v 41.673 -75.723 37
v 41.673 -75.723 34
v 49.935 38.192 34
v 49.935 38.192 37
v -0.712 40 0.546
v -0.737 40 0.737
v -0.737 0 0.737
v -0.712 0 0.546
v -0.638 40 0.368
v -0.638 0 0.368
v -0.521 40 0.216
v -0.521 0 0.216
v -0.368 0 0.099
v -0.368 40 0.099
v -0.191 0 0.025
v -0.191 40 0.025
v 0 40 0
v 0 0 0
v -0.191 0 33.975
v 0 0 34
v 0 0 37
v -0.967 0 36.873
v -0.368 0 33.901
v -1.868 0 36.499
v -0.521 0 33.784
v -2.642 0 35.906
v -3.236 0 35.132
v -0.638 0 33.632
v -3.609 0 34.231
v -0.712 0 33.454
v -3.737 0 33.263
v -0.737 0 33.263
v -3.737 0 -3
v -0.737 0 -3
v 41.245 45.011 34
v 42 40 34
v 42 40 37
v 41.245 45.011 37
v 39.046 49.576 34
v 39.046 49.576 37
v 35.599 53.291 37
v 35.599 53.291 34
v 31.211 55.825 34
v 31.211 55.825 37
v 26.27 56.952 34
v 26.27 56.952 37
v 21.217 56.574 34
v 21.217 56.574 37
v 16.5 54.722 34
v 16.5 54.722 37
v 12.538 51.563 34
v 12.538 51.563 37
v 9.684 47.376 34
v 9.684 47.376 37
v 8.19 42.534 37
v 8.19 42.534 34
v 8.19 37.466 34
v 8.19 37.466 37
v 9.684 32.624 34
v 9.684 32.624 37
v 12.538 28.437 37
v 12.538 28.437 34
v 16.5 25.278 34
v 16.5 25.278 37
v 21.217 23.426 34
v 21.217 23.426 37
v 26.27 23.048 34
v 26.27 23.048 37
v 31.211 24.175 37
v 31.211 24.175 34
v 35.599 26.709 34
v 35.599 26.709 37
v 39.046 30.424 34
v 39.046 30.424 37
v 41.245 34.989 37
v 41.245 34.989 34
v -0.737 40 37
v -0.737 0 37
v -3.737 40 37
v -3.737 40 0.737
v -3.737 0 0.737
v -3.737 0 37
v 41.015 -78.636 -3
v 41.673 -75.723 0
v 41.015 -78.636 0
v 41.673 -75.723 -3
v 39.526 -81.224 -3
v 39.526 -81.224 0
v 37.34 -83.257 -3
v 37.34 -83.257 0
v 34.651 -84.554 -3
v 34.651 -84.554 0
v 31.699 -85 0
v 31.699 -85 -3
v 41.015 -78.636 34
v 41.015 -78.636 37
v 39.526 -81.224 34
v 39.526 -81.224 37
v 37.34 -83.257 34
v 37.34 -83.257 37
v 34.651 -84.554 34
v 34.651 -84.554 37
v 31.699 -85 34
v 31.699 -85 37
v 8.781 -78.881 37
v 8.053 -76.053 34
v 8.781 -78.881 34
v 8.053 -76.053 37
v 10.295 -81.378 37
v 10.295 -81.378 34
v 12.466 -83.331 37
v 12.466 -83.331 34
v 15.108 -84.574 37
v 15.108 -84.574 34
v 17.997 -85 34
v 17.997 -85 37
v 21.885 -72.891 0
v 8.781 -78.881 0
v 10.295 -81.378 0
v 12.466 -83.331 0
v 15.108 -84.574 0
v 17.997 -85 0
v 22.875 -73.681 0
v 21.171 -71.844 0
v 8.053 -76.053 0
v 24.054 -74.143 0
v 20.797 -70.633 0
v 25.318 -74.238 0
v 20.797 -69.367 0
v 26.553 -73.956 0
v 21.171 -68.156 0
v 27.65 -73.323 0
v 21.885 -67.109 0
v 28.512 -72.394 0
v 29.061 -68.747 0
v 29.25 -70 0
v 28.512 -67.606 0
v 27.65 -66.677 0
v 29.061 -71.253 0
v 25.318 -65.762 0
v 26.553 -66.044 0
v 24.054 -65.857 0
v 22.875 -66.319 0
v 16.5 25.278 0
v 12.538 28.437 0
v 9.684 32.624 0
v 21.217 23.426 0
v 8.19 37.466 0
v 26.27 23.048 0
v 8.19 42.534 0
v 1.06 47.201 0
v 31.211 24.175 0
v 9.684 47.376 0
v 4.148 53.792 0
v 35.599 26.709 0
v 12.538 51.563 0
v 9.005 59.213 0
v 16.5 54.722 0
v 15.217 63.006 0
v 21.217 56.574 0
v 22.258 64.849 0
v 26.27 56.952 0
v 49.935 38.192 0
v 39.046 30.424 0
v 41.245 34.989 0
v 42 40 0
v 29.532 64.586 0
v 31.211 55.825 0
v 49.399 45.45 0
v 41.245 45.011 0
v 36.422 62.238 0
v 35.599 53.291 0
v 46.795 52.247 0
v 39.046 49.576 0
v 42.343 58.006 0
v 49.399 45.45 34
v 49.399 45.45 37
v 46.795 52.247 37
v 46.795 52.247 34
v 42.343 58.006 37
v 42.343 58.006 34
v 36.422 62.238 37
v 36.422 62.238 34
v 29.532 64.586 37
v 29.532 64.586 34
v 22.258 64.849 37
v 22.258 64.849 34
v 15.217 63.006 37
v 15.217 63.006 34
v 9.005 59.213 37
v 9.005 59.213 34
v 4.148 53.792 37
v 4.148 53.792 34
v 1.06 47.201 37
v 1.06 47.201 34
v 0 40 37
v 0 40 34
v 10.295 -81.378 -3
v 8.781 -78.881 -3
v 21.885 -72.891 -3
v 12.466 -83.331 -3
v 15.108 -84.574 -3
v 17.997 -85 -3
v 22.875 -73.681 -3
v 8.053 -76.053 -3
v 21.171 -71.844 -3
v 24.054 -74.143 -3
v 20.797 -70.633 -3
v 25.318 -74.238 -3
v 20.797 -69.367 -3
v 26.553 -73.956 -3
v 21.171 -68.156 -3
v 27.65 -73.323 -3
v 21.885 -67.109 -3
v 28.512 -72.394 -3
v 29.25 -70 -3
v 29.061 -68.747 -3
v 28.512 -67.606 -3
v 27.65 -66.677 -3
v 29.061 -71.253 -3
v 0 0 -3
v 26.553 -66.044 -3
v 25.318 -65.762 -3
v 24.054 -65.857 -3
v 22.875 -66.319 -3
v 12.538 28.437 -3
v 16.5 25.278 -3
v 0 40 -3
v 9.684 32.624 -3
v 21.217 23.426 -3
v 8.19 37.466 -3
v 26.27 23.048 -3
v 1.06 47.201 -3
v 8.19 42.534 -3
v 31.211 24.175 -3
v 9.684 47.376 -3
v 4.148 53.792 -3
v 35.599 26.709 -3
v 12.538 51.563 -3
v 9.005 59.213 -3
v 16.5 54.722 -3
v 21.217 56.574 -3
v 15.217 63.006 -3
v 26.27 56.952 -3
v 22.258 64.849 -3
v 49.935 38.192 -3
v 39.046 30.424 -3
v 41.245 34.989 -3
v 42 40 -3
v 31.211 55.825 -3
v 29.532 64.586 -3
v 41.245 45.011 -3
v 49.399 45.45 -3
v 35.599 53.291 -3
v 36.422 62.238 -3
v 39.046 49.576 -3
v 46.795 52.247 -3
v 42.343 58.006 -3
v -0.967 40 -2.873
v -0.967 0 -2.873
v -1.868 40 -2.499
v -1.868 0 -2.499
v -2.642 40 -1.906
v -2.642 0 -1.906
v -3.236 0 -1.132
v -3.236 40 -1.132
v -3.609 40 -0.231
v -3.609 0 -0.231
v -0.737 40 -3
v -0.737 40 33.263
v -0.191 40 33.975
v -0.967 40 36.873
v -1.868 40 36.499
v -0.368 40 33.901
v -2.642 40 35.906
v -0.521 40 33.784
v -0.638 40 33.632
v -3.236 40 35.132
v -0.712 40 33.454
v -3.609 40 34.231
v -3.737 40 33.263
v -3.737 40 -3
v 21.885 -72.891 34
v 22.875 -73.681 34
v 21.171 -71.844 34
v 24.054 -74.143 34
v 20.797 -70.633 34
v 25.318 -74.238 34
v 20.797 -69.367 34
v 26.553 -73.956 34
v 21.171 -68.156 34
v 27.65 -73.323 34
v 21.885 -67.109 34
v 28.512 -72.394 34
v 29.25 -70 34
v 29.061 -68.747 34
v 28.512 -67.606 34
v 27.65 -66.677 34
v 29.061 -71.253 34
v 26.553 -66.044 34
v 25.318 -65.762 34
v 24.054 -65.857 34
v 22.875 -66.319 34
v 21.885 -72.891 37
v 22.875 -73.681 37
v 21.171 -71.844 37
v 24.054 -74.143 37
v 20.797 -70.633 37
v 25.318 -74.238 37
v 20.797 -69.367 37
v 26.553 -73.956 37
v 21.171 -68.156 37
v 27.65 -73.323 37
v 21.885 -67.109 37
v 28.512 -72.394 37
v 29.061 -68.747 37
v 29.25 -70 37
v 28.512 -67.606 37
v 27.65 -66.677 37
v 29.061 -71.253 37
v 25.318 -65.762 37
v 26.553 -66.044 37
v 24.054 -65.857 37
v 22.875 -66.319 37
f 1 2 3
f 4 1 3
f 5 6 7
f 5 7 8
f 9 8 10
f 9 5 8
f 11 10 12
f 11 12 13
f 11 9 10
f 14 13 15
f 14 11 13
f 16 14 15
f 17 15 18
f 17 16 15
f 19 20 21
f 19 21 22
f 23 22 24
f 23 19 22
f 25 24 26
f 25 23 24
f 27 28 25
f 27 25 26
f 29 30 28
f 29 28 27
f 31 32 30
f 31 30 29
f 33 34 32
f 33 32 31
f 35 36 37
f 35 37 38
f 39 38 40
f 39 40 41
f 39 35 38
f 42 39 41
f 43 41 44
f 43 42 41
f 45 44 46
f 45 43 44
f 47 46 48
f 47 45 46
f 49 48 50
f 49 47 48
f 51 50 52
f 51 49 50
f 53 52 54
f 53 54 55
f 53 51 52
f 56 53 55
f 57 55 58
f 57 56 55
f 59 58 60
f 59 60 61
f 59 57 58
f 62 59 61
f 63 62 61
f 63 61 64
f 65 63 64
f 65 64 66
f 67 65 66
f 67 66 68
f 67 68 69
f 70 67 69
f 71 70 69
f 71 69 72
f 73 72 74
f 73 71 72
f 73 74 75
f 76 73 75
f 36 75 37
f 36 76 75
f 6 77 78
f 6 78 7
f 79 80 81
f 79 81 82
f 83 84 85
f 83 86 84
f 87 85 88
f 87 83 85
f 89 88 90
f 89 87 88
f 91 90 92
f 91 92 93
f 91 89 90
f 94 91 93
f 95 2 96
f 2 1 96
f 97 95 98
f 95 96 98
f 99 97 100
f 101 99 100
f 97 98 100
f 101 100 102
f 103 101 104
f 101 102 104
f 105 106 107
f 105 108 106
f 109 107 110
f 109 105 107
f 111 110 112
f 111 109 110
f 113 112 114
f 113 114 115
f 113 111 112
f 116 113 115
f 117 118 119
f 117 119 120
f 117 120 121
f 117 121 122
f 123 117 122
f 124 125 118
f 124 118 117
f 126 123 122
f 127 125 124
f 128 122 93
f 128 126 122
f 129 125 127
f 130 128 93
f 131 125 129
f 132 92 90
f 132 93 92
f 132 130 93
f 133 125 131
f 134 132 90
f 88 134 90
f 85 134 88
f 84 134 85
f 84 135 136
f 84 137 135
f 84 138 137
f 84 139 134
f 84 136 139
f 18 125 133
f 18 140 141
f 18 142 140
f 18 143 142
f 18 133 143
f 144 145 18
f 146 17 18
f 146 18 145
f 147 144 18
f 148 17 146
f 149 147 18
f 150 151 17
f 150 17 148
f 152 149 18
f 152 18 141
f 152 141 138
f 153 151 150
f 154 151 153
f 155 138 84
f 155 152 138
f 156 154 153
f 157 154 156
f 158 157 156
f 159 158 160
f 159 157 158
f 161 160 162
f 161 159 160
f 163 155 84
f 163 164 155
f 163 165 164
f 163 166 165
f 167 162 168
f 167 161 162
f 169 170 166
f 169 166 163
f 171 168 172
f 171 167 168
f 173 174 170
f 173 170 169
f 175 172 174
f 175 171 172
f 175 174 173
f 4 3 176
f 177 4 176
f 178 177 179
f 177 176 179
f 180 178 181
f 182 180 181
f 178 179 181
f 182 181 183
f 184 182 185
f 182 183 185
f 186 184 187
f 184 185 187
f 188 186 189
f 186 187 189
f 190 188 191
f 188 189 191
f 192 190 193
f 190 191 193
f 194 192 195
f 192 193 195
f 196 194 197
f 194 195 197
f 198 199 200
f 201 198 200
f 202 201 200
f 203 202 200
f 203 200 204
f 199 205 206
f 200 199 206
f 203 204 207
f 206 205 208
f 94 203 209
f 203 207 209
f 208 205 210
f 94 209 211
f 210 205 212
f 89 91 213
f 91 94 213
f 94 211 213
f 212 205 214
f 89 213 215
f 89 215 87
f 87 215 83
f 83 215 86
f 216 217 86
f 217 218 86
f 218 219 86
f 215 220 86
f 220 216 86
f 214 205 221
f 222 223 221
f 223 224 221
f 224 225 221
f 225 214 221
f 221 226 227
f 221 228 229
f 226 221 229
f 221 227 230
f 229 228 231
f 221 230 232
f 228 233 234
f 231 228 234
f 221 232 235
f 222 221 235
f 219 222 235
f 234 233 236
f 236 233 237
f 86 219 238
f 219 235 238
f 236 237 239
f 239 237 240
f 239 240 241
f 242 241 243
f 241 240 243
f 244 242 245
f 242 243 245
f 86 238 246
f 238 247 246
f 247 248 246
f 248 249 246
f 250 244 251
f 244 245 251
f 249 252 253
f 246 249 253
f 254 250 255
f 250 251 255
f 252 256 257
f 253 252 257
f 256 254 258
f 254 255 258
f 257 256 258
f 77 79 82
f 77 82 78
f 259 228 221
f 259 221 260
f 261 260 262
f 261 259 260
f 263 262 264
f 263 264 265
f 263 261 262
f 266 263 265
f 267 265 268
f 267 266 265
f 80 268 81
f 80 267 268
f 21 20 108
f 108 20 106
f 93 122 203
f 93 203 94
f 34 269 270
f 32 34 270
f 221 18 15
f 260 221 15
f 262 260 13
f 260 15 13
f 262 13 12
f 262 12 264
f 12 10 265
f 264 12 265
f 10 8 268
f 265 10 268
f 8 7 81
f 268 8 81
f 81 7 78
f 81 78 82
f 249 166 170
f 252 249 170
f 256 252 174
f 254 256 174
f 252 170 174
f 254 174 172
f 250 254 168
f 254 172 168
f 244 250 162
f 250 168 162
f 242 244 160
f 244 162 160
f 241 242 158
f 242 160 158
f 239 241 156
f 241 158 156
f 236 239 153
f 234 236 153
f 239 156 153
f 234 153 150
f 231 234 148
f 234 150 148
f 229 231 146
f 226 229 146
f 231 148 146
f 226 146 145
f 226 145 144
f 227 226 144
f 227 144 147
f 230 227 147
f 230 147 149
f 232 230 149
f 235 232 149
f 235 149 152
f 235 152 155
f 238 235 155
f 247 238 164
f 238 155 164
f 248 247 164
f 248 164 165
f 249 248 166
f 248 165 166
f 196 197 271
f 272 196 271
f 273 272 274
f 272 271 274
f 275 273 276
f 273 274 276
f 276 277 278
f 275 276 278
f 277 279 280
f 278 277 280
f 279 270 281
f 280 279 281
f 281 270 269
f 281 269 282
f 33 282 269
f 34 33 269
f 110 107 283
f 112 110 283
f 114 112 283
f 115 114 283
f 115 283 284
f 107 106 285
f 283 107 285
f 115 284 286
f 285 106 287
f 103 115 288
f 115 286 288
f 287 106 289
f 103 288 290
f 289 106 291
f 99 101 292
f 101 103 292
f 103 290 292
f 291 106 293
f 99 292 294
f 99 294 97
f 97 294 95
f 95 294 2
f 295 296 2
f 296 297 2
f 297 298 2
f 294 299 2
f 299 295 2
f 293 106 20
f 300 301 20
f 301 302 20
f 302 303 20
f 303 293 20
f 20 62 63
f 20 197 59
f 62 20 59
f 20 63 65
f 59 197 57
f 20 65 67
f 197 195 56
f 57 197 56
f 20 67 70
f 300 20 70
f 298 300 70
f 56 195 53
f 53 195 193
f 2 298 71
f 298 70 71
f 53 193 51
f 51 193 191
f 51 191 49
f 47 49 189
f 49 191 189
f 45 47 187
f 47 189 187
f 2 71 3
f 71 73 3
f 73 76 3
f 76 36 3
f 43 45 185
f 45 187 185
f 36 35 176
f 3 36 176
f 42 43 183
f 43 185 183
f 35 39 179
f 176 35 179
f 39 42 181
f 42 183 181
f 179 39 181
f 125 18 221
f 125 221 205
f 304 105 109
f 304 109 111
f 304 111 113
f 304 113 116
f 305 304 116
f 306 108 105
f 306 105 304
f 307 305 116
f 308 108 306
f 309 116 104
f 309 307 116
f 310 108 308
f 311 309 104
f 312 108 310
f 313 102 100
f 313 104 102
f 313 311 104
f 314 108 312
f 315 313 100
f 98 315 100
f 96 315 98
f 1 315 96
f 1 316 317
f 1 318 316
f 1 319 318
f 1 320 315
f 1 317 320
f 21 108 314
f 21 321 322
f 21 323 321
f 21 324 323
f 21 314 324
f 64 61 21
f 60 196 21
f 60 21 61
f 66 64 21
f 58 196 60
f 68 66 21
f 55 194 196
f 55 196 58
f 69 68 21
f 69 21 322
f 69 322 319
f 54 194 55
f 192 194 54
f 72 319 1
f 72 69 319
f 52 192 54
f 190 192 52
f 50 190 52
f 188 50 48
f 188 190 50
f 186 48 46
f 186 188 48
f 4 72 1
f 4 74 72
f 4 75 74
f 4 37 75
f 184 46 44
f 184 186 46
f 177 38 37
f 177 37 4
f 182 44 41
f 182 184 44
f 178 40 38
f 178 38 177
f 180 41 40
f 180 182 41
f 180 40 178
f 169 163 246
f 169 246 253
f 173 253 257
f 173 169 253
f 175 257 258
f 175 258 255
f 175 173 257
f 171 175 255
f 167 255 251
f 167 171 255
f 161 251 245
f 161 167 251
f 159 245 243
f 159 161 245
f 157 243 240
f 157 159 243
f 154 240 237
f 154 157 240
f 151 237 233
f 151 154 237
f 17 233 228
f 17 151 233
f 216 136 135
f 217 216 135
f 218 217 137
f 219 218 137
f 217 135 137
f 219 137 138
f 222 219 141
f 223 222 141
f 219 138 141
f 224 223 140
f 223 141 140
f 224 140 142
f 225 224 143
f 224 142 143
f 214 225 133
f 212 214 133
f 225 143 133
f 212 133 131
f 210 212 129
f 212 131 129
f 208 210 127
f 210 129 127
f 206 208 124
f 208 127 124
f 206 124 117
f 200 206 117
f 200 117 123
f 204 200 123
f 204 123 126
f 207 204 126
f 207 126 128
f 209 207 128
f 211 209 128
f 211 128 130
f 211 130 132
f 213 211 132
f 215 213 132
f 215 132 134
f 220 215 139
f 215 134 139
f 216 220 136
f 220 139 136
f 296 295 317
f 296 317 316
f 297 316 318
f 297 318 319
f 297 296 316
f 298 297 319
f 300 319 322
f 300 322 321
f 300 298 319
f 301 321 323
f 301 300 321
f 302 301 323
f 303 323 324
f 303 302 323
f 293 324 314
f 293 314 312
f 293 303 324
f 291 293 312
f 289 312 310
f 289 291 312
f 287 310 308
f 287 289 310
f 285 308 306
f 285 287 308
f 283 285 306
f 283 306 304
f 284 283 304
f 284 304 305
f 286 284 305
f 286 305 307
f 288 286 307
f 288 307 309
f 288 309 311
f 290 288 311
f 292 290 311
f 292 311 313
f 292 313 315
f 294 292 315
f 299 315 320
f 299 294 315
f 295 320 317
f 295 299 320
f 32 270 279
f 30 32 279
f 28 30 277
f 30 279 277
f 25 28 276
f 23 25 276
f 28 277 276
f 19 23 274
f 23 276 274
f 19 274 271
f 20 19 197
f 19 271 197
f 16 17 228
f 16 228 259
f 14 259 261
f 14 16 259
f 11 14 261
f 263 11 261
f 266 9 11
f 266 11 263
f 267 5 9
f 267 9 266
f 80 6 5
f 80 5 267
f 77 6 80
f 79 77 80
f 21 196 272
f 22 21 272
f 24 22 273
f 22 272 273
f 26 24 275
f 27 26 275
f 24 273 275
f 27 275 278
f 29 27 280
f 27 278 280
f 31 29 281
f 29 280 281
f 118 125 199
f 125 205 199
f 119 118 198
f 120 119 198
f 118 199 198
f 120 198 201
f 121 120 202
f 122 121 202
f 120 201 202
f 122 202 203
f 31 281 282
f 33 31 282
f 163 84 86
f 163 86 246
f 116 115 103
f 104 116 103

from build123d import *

# Parameters (mm, degrees)
SKETCH1_R          = 17
SKETCH1_R_2        = 4.25
BASE_FLANGE1_DEPTH = 3
EDGE_FLANGE1_DEPTH = 40
FILLET1_R          = 10
FILLET2_R          = 10


# Sheet-metal steps are written as plain solids
with BuildPart() as part:
    # Sketch1 → Base-Flange1 (new body)
    with BuildSketch(Plane.XY):
        with BuildLine():
            Line((0, 40), (0, 0))
            Line((0, 0), (9, -85))
            Line((9, -85), (41, -85))
            Line((41, -85), (49.934509251, 38.191617184))
            ThreePointArc((49.934509251, 38.191617184), (25.904784152, 64.983621948), (0, 40))
        make_face()
        with Locations((25, 40)):
            Circle(SKETCH1_R, mode=Mode.SUBTRACT)
        with Locations((25, -70)):
            Circle(SKETCH1_R_2, mode=Mode.SUBTRACT)
    extrude(amount=-BASE_FLANGE1_DEPTH)

    # Edge-Flange1 section (across the edge) → Edge-Flange1 (add)
    with BuildSketch(Plane(origin=(-0.7366, 40, 0), x_dir=(1, 0, 0), z_dir=(0, -1, 0))):
        with BuildLine():
            Line((-3, 0.7366), (-3, 37))
            Line((-3, 37), (0, 37))
            Line((0, 37), (0, 0.7366))
            ThreePointArc((0, 0.7366), (0.215745145, 0.215745145), (0.7366, 0))
            Line((0.7366, 0), (0.7366, -3))
            ThreePointArc((0.7366, -3), (-1.905575199, -1.905575199), (-3, 0.7366))
        make_face()
    extrude(amount=EDGE_FLANGE1_DEPTH)


with BuildPart() as body_2:
    # Mirror1: mirrored copy
    add(part.part.mirror(Plane(origin=(0, 0, 17), x_dir=(1, 0, 0), z_dir=(0, 0, -1))))

    # Fillet1
    fillet1_edges = [body_2.edges().sort_by_distance(p)[0] for p in [
        (41, -85, 35.5),
        (9, -85, 35.5),
    ]]
    fillet(fillet1_edges, radius=FILLET1_R)


with BuildPart() as part_1:
    add(part.part)

    # Fillet2
    fillet2_edges = [part_1.edges().sort_by_distance(p)[0] for p in [
        (41, -85, -1.5),
        (9, -85, -1.5),
    ]]
    fillet(fillet2_edges, radius=FILLET2_R)


solid = Compound([body_2.part, part_1.part])
